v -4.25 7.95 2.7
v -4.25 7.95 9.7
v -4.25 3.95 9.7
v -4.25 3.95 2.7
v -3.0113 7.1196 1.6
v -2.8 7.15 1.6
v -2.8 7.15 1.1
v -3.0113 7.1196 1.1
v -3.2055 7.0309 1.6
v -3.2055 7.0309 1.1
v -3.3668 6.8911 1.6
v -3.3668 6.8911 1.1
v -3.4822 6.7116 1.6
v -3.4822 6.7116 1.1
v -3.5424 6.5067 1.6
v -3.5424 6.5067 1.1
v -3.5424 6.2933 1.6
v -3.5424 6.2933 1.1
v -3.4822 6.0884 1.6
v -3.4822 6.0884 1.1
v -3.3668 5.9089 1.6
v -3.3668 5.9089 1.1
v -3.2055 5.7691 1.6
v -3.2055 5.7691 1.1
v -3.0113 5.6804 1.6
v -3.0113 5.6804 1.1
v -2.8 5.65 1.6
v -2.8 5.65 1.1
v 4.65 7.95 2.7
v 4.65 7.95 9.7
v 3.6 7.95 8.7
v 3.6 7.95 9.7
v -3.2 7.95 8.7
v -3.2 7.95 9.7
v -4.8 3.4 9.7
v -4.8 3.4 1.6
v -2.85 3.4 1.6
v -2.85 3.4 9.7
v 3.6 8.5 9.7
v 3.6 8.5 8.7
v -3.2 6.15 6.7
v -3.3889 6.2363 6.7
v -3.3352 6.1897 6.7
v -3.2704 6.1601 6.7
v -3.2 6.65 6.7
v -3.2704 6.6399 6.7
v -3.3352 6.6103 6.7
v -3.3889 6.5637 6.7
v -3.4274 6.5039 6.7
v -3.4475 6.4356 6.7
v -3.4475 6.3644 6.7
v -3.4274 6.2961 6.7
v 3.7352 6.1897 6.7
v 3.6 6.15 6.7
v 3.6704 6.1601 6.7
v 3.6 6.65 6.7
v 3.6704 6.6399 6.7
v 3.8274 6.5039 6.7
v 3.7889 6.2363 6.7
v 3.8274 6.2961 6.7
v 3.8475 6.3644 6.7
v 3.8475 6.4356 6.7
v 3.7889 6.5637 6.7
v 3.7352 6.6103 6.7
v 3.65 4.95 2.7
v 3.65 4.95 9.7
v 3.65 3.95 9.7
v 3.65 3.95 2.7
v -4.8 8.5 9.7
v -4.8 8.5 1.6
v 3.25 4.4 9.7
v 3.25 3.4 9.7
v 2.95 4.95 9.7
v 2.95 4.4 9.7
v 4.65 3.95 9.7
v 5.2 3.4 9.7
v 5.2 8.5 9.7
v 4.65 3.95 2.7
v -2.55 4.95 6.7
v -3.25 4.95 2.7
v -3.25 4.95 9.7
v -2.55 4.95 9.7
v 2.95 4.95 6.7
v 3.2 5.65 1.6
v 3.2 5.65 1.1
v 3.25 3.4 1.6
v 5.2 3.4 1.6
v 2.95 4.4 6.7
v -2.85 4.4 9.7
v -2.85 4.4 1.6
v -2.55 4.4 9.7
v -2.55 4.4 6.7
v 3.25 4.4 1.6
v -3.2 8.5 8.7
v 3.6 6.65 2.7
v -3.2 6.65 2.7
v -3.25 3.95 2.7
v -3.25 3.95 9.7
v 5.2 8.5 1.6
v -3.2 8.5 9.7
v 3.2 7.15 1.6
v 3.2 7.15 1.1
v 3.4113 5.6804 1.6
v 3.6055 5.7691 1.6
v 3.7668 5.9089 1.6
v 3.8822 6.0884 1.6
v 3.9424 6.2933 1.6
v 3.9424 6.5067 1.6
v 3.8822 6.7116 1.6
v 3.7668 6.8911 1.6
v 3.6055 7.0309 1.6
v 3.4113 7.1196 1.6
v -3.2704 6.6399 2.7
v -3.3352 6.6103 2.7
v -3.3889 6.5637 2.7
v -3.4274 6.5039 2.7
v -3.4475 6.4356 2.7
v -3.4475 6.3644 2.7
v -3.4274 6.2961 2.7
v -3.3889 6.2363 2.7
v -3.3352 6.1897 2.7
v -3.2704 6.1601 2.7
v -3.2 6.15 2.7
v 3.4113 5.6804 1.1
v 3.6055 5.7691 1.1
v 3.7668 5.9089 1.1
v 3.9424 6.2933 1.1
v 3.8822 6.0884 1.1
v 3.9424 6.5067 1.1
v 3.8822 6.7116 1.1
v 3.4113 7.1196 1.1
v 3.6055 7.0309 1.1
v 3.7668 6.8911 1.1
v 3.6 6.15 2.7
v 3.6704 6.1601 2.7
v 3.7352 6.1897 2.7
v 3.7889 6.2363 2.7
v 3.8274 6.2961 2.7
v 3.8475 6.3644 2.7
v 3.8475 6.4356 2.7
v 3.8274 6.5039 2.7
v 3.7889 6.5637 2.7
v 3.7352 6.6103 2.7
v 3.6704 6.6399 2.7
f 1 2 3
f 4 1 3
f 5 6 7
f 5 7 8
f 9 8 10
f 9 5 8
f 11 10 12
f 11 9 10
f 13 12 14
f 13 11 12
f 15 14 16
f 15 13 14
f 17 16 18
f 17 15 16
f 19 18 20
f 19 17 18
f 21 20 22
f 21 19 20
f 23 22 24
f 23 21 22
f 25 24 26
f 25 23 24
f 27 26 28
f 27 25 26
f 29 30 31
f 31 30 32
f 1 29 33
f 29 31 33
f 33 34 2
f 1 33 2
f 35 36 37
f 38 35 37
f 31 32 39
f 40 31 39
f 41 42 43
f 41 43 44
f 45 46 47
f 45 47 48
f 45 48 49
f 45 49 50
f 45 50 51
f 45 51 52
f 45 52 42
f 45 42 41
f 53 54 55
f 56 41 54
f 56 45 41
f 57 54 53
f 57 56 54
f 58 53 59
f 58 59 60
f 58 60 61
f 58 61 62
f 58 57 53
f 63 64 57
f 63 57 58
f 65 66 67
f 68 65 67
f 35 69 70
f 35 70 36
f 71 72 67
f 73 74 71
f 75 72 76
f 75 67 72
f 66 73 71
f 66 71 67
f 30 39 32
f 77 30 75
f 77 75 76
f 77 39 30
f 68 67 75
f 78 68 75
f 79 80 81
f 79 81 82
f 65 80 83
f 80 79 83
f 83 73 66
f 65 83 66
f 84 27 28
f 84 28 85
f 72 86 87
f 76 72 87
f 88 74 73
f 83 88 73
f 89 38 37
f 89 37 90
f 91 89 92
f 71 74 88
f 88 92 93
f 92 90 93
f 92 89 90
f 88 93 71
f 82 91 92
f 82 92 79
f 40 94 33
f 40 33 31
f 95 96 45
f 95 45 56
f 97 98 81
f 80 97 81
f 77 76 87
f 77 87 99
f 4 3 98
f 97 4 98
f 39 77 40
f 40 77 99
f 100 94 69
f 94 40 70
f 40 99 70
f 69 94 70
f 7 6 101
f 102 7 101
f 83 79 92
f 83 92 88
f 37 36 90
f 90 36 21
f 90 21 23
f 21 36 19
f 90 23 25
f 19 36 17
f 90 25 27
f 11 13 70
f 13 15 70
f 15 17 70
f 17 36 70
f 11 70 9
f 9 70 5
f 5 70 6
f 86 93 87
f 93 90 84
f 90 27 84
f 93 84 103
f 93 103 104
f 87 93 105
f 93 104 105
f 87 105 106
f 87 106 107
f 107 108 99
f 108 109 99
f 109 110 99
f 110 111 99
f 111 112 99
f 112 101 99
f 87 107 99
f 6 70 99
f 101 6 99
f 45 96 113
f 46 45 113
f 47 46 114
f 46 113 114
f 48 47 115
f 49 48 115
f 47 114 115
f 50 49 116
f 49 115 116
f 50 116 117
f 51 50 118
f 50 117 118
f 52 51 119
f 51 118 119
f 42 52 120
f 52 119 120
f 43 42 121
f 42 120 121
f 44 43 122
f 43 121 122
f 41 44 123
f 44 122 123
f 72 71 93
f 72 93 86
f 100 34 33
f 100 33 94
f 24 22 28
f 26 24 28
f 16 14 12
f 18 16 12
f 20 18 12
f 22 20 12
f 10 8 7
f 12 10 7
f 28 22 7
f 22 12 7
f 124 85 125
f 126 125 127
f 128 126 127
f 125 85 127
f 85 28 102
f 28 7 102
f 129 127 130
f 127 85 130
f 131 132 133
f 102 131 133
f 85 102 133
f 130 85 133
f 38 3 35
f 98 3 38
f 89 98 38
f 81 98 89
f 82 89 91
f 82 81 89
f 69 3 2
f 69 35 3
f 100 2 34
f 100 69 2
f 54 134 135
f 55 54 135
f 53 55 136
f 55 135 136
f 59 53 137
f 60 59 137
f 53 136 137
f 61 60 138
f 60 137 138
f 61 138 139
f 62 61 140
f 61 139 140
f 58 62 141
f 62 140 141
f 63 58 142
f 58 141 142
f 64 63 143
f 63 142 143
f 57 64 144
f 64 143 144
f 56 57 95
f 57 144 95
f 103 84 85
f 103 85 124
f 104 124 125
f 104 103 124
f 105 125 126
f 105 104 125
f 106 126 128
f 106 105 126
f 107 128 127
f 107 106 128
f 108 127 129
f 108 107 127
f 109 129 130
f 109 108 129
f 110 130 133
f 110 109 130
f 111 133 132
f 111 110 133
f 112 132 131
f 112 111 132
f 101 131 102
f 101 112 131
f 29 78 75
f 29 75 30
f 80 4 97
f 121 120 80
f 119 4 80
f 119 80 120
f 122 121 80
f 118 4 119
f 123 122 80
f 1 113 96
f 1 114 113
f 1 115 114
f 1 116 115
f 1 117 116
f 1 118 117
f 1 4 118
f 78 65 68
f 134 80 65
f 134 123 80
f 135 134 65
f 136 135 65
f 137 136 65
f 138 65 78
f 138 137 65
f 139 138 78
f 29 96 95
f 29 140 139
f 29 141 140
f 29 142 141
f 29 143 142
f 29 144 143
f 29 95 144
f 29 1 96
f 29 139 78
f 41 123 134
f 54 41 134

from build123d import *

# Parameters (mm, degrees)
PAD005_DEPTH    = 8.1
POCKET003_DEPTH = 7
SKETCH010_W     = 6.8
SKETCH010_H     = 5
POCKET004_DEPTH = 1
SKETCH011_W     = 5.5
SKETCH011_H     = 3
POCKET005_DEPTH = 3
PAD006_DEPTH    = 4
PAD007_DEPTH    = 0.5


with BuildPart() as part:
    # Sketch008 → Pad005 (new body)
    with BuildSketch(Plane.XY):
        Polygon((-5, 0), (-3.05, 0), (-3.05, 1), (3.05, 1), (3.05, 0), (5, 0), (5, 5.1), (-5, 5.1), align=None)
    extrude(amount=PAD005_DEPTH)

    # Sketch009 (on Face10 of Pad005) → Pocket003 (cut)
    with BuildSketch(Plane.XY.offset(8.1)):
        Polygon((-4.45, 0.55), (-3.45, 0.55), (-3.45, 1.55), (3.45, 1.55), (3.45, 0.55), (4.45, 0.55), (4.45, 4.55), (-4.45, 4.55), align=None)
    extrude(amount=-POCKET003_DEPTH, mode=Mode.SUBTRACT)

    # Sketch010 (on Face5 of Pocket003) → Pocket004 (cut)
    with BuildSketch(Plane.XY.offset(8.1)):
        with Locations((0, 5.5)):
            Rectangle(SKETCH010_W, SKETCH010_H)
    extrude(amount=-POCKET004_DEPTH, mode=Mode.SUBTRACT)

    # Sketch011 (on Face5 of Pocket004) → Pocket005 (cut)
    with BuildSketch(Plane.XY.offset(8.1)):
        with Locations((0, 1.5)):
            Rectangle(SKETCH011_W, SKETCH011_H)
    extrude(amount=-POCKET005_DEPTH, mode=Mode.SUBTRACT)

    # Sketch012 (on Face26 of Pocket005) → Pad006 (join)
    with BuildSketch(Plane.XY.offset(1.1)):
        with BuildLine():
            ThreePointArc((-3.4, 3.25), (-3.65, 3), (-3.4, 2.75))
            Line((-3.4, 2.75), (3.4, 2.75))
            ThreePointArc((3.4, 2.75), (3.65, 3), (3.4, 3.25))
            Line((-3.4, 3.25), (3.4, 3.25))
        make_face()
    extrude(amount=PAD006_DEPTH)

    # Sketch013 → Pad007 (join)
    with BuildSketch(Plane.XY):
        with BuildLine():
            ThreePointArc((-3, 3.75), (-3.75, 3), (-3, 2.25))
            Line((-3, 2.25), (3, 2.25))
            ThreePointArc((3, 2.25), (3.75, 3), (3, 3.75))
            Line((-3, 3.75), (3, 3.75))
        make_face()
    extrude(amount=-PAD007_DEPTH)


with BuildPart() as part_1:
    # Body005 placement: moved
    add(part.part.moved(Location((0.2, 3.4, 1.6))))


solid = part_1.part
